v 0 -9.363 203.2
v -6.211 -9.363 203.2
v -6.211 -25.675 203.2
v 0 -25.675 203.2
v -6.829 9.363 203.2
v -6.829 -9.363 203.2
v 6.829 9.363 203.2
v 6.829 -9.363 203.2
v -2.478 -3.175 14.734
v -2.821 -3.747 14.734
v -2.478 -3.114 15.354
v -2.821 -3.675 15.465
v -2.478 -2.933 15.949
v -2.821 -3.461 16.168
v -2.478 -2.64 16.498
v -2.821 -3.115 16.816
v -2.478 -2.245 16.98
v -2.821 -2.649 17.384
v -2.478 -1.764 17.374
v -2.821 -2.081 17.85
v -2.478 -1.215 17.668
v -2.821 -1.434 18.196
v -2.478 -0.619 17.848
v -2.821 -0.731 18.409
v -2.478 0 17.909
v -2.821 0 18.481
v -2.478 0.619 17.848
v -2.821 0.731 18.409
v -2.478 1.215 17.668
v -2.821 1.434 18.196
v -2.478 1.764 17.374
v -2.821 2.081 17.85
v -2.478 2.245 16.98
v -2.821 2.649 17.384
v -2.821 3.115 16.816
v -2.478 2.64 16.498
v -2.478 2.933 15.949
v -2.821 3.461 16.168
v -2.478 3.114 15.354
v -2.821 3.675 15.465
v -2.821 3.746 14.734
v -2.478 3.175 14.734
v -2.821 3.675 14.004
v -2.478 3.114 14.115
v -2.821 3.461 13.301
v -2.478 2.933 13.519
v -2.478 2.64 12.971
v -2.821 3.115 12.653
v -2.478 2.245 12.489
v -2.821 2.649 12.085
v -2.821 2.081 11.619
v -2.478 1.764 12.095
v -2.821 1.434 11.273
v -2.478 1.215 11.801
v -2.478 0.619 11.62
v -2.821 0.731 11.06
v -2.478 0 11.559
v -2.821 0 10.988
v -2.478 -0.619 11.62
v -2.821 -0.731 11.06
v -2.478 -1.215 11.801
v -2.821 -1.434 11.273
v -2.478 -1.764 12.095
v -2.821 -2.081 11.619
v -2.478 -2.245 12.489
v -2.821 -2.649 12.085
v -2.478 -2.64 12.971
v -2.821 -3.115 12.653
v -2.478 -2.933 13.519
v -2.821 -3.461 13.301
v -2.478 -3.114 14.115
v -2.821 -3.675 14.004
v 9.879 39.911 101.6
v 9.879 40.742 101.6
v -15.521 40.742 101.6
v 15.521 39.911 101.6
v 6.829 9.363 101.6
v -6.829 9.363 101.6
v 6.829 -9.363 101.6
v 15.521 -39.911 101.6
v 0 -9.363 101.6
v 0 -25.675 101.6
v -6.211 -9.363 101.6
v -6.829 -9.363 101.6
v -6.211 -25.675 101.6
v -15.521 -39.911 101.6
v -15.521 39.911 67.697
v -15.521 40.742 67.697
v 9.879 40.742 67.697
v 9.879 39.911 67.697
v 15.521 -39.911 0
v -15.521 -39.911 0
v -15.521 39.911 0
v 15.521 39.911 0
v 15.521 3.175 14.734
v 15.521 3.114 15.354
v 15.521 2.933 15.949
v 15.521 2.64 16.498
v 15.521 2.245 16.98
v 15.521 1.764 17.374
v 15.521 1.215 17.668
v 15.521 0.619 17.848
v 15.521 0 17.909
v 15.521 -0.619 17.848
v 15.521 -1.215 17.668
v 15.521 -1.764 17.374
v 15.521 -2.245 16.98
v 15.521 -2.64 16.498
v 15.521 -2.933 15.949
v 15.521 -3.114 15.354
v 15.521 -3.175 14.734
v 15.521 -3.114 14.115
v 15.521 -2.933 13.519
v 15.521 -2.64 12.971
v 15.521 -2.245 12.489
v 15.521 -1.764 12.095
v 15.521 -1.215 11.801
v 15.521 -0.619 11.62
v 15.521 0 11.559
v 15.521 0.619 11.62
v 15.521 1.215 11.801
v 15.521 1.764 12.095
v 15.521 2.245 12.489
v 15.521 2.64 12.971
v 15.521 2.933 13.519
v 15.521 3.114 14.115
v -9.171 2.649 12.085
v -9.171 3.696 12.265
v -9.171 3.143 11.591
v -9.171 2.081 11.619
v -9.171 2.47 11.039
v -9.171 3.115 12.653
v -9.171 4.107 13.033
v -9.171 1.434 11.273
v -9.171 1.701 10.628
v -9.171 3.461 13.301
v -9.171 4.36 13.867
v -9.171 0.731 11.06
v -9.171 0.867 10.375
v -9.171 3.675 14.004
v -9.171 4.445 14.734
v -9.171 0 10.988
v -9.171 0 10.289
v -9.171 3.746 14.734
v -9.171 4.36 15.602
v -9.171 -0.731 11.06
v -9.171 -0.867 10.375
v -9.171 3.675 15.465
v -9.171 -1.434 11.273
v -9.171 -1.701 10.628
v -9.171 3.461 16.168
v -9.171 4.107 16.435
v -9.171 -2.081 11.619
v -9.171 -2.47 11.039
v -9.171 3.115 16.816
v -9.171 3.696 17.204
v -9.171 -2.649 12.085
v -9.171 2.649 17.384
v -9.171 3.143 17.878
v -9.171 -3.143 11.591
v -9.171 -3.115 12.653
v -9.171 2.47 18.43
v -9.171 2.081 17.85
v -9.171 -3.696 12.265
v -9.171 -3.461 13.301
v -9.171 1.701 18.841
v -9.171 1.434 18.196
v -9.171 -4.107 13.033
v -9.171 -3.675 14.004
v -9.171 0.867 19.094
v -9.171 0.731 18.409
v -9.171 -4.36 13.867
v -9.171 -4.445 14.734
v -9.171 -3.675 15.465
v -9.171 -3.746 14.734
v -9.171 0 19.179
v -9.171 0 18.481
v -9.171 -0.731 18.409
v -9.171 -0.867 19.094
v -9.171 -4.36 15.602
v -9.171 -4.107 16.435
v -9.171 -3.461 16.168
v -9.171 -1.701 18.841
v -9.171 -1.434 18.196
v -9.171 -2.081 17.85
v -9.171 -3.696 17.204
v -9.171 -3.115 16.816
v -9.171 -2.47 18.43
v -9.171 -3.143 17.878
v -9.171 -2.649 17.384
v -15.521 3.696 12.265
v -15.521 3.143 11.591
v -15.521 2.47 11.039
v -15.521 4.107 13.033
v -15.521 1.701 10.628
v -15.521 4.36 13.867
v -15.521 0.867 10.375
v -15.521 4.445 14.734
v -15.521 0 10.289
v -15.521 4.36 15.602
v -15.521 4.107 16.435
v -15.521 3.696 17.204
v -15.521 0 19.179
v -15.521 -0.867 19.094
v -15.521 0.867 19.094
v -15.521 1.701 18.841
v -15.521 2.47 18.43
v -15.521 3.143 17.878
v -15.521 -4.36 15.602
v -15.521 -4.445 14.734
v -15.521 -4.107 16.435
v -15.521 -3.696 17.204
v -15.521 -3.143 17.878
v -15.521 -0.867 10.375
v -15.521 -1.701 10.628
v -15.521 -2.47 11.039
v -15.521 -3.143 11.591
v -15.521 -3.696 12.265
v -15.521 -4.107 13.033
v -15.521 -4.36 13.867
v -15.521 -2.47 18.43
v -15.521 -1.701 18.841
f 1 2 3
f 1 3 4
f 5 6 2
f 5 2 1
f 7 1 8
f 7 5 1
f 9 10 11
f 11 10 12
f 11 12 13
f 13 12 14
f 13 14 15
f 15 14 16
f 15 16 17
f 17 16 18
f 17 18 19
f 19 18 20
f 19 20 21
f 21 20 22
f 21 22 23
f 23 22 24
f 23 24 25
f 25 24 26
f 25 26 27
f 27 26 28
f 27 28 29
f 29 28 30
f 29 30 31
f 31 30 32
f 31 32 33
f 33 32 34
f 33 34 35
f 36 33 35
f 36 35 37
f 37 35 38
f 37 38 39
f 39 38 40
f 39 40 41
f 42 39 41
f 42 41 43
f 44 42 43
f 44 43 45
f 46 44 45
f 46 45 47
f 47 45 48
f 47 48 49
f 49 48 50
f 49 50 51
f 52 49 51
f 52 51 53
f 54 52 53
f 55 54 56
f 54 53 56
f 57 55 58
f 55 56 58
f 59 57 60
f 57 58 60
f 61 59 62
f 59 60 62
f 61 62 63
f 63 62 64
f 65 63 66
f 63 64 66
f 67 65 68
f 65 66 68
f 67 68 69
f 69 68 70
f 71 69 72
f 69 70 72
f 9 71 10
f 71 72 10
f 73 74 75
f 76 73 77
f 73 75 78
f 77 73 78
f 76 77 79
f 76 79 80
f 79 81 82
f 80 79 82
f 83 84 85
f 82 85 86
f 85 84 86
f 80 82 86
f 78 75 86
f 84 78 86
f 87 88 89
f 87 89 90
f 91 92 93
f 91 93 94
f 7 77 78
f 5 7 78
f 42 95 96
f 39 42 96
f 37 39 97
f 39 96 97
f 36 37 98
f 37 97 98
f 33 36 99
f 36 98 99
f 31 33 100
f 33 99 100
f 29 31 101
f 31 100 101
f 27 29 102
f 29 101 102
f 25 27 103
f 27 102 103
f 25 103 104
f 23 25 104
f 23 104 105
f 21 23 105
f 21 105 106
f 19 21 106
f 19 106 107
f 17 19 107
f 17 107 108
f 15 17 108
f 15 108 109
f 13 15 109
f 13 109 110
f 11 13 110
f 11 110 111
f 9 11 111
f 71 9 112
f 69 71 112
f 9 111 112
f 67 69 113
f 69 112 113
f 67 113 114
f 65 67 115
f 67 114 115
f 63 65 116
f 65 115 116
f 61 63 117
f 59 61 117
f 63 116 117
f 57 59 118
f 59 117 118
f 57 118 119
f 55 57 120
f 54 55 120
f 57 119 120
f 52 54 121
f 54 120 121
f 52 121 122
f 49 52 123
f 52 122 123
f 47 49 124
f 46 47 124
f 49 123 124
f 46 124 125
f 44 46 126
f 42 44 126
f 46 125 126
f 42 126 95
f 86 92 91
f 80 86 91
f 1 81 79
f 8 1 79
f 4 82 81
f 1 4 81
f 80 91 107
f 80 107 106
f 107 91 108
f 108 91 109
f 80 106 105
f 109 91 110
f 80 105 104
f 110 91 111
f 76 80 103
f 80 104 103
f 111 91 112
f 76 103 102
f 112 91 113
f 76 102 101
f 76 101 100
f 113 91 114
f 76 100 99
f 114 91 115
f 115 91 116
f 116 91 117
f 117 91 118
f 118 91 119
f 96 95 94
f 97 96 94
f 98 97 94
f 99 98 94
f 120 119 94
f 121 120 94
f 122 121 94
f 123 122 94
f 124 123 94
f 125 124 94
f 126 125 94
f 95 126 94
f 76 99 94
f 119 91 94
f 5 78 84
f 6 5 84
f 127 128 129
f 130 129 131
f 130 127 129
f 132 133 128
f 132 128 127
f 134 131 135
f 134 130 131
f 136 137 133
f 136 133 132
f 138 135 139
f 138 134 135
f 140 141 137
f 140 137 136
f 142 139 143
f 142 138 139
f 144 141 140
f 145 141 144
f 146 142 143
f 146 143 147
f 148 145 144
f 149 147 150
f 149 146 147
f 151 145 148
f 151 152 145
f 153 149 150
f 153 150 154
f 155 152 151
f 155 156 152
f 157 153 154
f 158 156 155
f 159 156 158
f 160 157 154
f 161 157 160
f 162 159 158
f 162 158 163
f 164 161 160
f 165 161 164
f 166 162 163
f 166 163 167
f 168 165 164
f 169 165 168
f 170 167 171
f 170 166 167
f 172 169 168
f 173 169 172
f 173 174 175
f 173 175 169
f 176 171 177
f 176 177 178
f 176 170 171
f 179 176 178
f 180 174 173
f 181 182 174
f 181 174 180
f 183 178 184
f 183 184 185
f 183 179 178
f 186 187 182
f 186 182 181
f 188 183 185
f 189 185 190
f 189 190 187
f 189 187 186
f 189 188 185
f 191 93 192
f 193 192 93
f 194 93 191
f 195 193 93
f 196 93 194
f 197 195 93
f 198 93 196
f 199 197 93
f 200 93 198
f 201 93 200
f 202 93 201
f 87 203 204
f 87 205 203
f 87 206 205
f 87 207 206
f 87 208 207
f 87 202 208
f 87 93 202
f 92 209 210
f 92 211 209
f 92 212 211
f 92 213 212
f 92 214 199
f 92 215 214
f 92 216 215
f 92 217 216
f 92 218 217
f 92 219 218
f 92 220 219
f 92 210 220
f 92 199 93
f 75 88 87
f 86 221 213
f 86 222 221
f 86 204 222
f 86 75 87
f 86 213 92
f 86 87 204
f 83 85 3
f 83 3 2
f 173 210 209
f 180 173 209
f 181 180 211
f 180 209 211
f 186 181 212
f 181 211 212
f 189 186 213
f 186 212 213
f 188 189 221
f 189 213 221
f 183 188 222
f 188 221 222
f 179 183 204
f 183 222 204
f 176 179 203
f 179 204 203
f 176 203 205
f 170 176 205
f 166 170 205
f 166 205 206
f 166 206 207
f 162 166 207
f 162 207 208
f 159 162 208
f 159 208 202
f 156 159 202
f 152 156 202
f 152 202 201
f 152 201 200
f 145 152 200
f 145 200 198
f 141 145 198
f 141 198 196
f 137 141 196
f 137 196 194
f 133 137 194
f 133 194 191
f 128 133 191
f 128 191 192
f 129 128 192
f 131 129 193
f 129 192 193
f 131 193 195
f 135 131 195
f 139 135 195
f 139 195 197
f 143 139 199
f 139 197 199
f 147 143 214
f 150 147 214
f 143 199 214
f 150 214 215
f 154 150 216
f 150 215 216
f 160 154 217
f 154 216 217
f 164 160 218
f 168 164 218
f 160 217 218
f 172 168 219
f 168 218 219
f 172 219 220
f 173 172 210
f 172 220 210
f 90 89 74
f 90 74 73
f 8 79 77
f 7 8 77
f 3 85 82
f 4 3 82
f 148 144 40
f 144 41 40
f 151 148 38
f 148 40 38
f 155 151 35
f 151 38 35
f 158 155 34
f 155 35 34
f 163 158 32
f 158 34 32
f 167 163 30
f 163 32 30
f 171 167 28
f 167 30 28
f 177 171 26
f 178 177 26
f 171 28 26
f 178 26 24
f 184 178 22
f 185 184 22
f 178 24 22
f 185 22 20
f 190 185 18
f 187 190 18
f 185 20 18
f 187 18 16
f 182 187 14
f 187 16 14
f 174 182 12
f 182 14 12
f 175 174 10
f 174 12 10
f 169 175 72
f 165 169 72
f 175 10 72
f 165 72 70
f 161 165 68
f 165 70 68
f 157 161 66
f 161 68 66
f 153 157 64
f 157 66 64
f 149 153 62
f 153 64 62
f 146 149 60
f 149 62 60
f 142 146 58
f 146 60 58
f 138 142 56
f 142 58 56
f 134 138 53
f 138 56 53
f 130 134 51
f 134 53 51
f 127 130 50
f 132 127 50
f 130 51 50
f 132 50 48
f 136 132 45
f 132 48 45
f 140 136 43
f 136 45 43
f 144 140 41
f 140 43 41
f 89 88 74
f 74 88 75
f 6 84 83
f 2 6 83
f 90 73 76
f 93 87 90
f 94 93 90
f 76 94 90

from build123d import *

# Parameters (mm, degrees)
F0_W           = 31.0422331095
F0_H           = 79.8228383064
F1_DEPTH       = 101.6
F3_D           = 6.35
F5_D           = 7.493
F5_DEPTH       = 12.7
F5_CBORE_D     = 8.89
F5_CBORE_DEPTH = 6.35
F5_TIP         = 2.2511243092
F6_W           = 47.3317652941
F6_H           = 33.903124404
F7_DEPTH       = 25.4
F8_W           = 6.2107620761
F8_H           = 16.3113800809
F8_H_2         = 9.3631437048
F9_DEPTH       = 101.6


with BuildPart() as f1:
    # F0 (on Top) → F1 (new body)
    with BuildSketch(Plane.XY):
        Rectangle(F0_W, F0_H)
    extrude(amount=F1_DEPTH)

    # F3 (through all)
    with Locations(Plane(origin=(-15.5211165547, 0, 0), x_dir=(0, -1, 0), z_dir=(-1, 0, 0))):
        with Locations((0, 14.7344674915)):
            Hole(F3_D / 2)

    # F5
    with Locations(Plane(origin=(-15.5211165547, 0, 0), x_dir=(0, -1, 0), z_dir=(-1, 0, 0))):
        with Locations((0, 14.7344674915)):
            CounterBoreHole(F5_D / 2, F5_CBORE_D / 2, F5_CBORE_DEPTH, depth=F5_DEPTH)
            with Locations((0, 0, -(F5_DEPTH + F5_TIP / 2))):  # 118° drill point
                Cone(0, F5_D / 2, F5_TIP, mode=Mode.SUBTRACT)

    # F6 (on face) → F7 (join)
    with BuildSketch(Plane(origin=(-15.5211165547, 0, 0), x_dir=(0, -1, 0), z_dir=(-1, 0, 0))):
        with Locations((-17.0762408525, 84.648437798)):
            Rectangle(F6_W, F6_H)
    extrude(amount=-F7_DEPTH)

    # F8 (on face) → F9 (join)
    with BuildSketch(Plane.XY.offset(101.6)):
        with Locations((-3.105381038, -17.5188337453)):
            Rectangle(F8_W, F8_H)
        Polygon((-6.8292533979, 9.3631437048), (-6.8292533979, -9.3631437048), (-6.2107620761, -9.3631437048), (-6.2107620761, 0), (0, 0), (0, -9.3631437048), (6.8292533979, -9.3631437048), (6.8292533979, 9.3631437048), align=None)
        with Locations((-3.105381038, -4.6815718524)):
            Rectangle(F8_W, F8_H_2)
    extrude(amount=F9_DEPTH)


solid = f1.part
